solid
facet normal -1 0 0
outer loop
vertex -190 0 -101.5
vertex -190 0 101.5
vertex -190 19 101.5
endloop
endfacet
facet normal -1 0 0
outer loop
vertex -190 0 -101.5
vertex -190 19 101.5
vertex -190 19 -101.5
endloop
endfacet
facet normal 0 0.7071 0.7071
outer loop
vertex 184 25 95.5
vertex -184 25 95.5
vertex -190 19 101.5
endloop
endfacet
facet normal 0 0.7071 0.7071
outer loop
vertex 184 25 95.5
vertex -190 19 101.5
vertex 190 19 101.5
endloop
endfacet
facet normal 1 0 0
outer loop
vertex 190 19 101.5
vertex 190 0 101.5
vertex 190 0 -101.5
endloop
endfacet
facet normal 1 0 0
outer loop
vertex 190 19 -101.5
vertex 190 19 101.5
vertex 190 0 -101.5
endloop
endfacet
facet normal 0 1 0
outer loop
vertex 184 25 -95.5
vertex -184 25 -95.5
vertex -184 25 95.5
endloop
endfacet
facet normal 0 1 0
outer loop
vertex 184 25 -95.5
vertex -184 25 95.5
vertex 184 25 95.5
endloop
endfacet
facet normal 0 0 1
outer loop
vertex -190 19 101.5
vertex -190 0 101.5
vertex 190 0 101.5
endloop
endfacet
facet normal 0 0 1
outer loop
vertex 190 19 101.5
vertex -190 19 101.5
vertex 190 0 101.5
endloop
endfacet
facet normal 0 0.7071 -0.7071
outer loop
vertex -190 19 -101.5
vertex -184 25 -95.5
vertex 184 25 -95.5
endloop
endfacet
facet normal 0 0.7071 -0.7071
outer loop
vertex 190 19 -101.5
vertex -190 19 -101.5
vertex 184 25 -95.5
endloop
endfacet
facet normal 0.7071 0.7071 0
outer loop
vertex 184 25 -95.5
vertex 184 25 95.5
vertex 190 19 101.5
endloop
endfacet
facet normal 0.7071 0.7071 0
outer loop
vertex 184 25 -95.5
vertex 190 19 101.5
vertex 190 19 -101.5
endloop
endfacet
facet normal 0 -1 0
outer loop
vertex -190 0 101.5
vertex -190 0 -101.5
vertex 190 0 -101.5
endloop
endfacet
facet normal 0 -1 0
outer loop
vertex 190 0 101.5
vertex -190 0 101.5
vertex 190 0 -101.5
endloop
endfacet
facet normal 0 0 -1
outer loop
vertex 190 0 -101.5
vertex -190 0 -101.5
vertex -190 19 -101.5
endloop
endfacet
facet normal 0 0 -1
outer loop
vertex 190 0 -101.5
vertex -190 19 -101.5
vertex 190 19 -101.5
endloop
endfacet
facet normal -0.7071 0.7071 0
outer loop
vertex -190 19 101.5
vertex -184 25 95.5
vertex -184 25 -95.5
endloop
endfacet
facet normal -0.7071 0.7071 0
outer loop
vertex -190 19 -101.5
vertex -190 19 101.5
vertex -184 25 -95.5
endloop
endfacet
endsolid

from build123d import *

# Parameters (mm, degrees)
SKETCH1_W           = 380
SKETCH1_H           = 203
BOSS_EXTRUDE1_DEPTH = 25
CHAMFER1_SIZE       = 6


with BuildPart() as part:
    # Sketch1 → Boss-Extrude1 (new body)
    with BuildSketch(Plane(origin=(0, 0, 0), x_dir=(1, 0, 0), z_dir=(0, 1, 0))):
        Rectangle(SKETCH1_W, SKETCH1_H)
    extrude(amount=BOSS_EXTRUDE1_DEPTH)

    # Chamfer1
    chamfer1_edges = [part.edges().sort_by_distance(p)[0] for p in [
        (190, 25, 0),
        (0, 25, -101.5),
        (-190, 25, 0),
        (0, 25, 101.5),
    ]]
    chamfer(chamfer1_edges, length=CHAMFER1_SIZE)


solid = part.part
